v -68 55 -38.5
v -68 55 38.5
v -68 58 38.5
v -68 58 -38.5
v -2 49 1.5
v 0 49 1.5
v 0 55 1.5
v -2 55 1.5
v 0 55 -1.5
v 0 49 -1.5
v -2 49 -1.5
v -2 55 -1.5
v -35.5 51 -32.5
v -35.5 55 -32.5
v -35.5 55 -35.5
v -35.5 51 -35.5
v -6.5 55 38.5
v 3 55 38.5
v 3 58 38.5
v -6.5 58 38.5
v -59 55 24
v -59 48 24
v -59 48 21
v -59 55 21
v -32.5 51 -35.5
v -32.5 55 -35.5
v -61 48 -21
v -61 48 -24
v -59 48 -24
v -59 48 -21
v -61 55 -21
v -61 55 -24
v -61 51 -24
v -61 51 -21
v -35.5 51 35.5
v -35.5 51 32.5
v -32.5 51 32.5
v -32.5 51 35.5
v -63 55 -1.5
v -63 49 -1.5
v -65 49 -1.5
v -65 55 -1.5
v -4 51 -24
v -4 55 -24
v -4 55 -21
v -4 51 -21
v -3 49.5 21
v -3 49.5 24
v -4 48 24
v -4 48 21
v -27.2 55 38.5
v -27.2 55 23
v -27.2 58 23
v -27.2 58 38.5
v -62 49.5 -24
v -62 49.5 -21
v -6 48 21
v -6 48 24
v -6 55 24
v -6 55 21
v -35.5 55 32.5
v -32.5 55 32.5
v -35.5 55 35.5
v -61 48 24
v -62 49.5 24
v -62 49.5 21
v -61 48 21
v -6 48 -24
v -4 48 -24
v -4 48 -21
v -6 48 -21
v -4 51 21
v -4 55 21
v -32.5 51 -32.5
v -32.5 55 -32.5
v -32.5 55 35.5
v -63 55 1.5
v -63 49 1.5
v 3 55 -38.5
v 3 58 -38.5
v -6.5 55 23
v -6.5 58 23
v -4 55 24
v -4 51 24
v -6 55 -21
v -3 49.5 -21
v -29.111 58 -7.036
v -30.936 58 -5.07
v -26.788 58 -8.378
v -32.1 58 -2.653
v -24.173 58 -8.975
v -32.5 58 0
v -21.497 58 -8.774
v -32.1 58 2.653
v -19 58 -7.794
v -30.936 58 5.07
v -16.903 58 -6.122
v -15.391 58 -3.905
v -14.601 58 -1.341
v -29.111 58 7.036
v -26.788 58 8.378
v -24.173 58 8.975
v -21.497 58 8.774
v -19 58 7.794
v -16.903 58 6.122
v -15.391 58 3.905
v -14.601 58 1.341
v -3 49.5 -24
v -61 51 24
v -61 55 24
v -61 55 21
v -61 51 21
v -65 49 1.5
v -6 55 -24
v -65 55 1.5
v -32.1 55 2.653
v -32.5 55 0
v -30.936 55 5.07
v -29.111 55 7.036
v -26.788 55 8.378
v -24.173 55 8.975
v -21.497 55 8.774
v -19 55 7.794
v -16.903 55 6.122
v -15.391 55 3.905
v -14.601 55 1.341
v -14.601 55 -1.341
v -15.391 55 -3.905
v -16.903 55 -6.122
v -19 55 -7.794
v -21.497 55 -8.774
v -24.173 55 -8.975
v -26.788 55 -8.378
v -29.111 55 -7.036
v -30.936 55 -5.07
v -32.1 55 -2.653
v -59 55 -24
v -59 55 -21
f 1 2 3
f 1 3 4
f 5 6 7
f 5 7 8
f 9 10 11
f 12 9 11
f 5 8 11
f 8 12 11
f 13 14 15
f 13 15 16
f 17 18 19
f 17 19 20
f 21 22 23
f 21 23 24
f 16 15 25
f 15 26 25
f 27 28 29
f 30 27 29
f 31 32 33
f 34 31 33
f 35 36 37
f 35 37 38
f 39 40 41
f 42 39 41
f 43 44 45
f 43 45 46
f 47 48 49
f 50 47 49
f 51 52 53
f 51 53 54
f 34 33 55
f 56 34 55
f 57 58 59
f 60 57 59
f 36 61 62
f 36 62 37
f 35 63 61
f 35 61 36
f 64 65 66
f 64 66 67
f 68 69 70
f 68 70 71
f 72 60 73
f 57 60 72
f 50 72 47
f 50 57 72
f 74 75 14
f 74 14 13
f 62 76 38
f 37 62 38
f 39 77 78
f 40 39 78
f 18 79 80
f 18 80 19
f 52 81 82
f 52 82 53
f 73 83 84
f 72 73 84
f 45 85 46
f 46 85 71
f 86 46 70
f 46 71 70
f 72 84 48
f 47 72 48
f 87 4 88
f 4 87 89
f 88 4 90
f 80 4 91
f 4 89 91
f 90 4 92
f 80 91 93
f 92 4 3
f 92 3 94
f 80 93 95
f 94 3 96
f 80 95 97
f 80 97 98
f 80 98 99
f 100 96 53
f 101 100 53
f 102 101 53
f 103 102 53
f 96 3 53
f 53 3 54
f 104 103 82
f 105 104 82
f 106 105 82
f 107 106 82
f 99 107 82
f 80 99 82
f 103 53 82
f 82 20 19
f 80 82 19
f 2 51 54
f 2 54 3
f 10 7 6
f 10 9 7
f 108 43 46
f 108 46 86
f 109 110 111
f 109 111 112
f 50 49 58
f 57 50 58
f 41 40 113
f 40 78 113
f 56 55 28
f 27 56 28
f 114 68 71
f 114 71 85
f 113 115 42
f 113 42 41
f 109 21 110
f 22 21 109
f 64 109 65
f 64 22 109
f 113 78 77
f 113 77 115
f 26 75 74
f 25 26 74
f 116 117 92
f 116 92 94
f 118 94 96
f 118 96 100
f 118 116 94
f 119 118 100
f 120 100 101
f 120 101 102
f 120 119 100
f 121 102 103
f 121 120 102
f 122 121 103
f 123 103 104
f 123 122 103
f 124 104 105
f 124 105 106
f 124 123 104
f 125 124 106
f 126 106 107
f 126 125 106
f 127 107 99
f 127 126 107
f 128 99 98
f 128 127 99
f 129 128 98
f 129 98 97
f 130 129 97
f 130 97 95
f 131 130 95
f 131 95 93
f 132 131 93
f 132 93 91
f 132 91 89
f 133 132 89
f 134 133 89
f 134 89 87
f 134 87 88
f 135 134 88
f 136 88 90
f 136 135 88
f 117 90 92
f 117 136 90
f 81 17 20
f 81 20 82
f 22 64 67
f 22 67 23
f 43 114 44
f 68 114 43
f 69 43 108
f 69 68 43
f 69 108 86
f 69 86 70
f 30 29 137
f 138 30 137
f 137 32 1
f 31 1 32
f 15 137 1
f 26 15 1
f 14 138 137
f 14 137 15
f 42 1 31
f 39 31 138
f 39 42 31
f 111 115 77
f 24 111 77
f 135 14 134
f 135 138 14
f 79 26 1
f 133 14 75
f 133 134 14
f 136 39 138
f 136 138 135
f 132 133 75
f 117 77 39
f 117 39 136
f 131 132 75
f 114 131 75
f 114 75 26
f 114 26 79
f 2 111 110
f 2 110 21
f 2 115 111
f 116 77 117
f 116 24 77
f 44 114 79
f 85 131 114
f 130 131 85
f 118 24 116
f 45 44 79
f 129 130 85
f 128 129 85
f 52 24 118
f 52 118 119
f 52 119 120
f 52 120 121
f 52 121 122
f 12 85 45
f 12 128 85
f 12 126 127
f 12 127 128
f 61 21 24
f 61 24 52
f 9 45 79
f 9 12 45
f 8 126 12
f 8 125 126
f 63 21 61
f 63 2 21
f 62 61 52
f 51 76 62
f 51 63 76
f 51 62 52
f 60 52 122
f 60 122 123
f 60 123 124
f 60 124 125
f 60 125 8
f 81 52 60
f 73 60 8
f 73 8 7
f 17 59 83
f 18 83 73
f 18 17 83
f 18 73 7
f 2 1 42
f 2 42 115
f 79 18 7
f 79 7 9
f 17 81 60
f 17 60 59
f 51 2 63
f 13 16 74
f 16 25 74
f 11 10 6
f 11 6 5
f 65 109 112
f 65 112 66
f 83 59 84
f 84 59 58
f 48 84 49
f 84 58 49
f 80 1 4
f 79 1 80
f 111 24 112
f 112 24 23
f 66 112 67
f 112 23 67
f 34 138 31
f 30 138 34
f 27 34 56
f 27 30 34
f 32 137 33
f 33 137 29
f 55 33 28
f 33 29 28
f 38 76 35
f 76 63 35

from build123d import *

# Parameters (mm, degrees)
SKETCH010_R             = 9
PAD006_DEPTH            = 3
PAD007_DEPTH            = 3
SKETCH012_W             = 2
SKETCH012_H             = 6
PAD008_DEPTH            = 1.5
SKETCH013_W             = 4
SKETCH013_H             = 3
PAD009_DEPTH            = 1.5
BODY004_PLACEMENT_ANGLE = 180


with BuildPart() as part:
    # Sketch010 → Pad006 (new body)
    with BuildSketch(Plane.XZ):
        Polygon((68, 38.5), (68, -38.5), (-3, -38.5), (-3, 38.5), (6.5, 38.5), (6.5, 23), (27.2, 23), (27.2, 38.5), align=None)
        with Locations((23.5, 0)):
            Circle(SKETCH010_R, mode=Mode.SUBTRACT)
    extrude(amount=PAD006_DEPTH)

    # Sketch011 → Pad007 (join)
    with BuildSketch(Plane.XY.offset(24)):
        Polygon((61, 0), (61, 4), (62, 5.5), (61, 7), (59, 7), (59, 0), align=None)
        Polygon((4, 0), (4, 4), (3, 5.5), (4, 7), (6, 7), (6, 0), align=None)
    pad007 = extrude(amount=-PAD007_DEPTH)

    # Mirrored002: Pad007 across XY
    add(pad007.mirror(Plane.XY))

    # Sketch012 → Pad008 (join, symmetric)
    with BuildSketch(Plane.XY):
        with Locations((1, 3)):
            Rectangle(SKETCH012_W, SKETCH012_H)
        with Locations((64, 3)):
            Rectangle(SKETCH012_W, SKETCH012_H)
    extrude(amount=PAD008_DEPTH, both=True)

    # Sketch013 → Pad009 (join, symmetric)
    with BuildSketch(Plane.YZ.offset(34)):
        with Locations((2, -34)):
            Rectangle(SKETCH013_W, SKETCH013_H)
        with Locations((2, 34)):
            Rectangle(SKETCH013_W, SKETCH013_H)
    extrude(amount=PAD009_DEPTH, both=True)


with BuildPart() as part_1:
    # Body004 placement: moved
    add(part.part.moved(Location((0, 55, 0))).rotate(Axis((0, 55, 0), (0, 0, 1)), BODY004_PLACEMENT_ANGLE))


solid = part_1.part
